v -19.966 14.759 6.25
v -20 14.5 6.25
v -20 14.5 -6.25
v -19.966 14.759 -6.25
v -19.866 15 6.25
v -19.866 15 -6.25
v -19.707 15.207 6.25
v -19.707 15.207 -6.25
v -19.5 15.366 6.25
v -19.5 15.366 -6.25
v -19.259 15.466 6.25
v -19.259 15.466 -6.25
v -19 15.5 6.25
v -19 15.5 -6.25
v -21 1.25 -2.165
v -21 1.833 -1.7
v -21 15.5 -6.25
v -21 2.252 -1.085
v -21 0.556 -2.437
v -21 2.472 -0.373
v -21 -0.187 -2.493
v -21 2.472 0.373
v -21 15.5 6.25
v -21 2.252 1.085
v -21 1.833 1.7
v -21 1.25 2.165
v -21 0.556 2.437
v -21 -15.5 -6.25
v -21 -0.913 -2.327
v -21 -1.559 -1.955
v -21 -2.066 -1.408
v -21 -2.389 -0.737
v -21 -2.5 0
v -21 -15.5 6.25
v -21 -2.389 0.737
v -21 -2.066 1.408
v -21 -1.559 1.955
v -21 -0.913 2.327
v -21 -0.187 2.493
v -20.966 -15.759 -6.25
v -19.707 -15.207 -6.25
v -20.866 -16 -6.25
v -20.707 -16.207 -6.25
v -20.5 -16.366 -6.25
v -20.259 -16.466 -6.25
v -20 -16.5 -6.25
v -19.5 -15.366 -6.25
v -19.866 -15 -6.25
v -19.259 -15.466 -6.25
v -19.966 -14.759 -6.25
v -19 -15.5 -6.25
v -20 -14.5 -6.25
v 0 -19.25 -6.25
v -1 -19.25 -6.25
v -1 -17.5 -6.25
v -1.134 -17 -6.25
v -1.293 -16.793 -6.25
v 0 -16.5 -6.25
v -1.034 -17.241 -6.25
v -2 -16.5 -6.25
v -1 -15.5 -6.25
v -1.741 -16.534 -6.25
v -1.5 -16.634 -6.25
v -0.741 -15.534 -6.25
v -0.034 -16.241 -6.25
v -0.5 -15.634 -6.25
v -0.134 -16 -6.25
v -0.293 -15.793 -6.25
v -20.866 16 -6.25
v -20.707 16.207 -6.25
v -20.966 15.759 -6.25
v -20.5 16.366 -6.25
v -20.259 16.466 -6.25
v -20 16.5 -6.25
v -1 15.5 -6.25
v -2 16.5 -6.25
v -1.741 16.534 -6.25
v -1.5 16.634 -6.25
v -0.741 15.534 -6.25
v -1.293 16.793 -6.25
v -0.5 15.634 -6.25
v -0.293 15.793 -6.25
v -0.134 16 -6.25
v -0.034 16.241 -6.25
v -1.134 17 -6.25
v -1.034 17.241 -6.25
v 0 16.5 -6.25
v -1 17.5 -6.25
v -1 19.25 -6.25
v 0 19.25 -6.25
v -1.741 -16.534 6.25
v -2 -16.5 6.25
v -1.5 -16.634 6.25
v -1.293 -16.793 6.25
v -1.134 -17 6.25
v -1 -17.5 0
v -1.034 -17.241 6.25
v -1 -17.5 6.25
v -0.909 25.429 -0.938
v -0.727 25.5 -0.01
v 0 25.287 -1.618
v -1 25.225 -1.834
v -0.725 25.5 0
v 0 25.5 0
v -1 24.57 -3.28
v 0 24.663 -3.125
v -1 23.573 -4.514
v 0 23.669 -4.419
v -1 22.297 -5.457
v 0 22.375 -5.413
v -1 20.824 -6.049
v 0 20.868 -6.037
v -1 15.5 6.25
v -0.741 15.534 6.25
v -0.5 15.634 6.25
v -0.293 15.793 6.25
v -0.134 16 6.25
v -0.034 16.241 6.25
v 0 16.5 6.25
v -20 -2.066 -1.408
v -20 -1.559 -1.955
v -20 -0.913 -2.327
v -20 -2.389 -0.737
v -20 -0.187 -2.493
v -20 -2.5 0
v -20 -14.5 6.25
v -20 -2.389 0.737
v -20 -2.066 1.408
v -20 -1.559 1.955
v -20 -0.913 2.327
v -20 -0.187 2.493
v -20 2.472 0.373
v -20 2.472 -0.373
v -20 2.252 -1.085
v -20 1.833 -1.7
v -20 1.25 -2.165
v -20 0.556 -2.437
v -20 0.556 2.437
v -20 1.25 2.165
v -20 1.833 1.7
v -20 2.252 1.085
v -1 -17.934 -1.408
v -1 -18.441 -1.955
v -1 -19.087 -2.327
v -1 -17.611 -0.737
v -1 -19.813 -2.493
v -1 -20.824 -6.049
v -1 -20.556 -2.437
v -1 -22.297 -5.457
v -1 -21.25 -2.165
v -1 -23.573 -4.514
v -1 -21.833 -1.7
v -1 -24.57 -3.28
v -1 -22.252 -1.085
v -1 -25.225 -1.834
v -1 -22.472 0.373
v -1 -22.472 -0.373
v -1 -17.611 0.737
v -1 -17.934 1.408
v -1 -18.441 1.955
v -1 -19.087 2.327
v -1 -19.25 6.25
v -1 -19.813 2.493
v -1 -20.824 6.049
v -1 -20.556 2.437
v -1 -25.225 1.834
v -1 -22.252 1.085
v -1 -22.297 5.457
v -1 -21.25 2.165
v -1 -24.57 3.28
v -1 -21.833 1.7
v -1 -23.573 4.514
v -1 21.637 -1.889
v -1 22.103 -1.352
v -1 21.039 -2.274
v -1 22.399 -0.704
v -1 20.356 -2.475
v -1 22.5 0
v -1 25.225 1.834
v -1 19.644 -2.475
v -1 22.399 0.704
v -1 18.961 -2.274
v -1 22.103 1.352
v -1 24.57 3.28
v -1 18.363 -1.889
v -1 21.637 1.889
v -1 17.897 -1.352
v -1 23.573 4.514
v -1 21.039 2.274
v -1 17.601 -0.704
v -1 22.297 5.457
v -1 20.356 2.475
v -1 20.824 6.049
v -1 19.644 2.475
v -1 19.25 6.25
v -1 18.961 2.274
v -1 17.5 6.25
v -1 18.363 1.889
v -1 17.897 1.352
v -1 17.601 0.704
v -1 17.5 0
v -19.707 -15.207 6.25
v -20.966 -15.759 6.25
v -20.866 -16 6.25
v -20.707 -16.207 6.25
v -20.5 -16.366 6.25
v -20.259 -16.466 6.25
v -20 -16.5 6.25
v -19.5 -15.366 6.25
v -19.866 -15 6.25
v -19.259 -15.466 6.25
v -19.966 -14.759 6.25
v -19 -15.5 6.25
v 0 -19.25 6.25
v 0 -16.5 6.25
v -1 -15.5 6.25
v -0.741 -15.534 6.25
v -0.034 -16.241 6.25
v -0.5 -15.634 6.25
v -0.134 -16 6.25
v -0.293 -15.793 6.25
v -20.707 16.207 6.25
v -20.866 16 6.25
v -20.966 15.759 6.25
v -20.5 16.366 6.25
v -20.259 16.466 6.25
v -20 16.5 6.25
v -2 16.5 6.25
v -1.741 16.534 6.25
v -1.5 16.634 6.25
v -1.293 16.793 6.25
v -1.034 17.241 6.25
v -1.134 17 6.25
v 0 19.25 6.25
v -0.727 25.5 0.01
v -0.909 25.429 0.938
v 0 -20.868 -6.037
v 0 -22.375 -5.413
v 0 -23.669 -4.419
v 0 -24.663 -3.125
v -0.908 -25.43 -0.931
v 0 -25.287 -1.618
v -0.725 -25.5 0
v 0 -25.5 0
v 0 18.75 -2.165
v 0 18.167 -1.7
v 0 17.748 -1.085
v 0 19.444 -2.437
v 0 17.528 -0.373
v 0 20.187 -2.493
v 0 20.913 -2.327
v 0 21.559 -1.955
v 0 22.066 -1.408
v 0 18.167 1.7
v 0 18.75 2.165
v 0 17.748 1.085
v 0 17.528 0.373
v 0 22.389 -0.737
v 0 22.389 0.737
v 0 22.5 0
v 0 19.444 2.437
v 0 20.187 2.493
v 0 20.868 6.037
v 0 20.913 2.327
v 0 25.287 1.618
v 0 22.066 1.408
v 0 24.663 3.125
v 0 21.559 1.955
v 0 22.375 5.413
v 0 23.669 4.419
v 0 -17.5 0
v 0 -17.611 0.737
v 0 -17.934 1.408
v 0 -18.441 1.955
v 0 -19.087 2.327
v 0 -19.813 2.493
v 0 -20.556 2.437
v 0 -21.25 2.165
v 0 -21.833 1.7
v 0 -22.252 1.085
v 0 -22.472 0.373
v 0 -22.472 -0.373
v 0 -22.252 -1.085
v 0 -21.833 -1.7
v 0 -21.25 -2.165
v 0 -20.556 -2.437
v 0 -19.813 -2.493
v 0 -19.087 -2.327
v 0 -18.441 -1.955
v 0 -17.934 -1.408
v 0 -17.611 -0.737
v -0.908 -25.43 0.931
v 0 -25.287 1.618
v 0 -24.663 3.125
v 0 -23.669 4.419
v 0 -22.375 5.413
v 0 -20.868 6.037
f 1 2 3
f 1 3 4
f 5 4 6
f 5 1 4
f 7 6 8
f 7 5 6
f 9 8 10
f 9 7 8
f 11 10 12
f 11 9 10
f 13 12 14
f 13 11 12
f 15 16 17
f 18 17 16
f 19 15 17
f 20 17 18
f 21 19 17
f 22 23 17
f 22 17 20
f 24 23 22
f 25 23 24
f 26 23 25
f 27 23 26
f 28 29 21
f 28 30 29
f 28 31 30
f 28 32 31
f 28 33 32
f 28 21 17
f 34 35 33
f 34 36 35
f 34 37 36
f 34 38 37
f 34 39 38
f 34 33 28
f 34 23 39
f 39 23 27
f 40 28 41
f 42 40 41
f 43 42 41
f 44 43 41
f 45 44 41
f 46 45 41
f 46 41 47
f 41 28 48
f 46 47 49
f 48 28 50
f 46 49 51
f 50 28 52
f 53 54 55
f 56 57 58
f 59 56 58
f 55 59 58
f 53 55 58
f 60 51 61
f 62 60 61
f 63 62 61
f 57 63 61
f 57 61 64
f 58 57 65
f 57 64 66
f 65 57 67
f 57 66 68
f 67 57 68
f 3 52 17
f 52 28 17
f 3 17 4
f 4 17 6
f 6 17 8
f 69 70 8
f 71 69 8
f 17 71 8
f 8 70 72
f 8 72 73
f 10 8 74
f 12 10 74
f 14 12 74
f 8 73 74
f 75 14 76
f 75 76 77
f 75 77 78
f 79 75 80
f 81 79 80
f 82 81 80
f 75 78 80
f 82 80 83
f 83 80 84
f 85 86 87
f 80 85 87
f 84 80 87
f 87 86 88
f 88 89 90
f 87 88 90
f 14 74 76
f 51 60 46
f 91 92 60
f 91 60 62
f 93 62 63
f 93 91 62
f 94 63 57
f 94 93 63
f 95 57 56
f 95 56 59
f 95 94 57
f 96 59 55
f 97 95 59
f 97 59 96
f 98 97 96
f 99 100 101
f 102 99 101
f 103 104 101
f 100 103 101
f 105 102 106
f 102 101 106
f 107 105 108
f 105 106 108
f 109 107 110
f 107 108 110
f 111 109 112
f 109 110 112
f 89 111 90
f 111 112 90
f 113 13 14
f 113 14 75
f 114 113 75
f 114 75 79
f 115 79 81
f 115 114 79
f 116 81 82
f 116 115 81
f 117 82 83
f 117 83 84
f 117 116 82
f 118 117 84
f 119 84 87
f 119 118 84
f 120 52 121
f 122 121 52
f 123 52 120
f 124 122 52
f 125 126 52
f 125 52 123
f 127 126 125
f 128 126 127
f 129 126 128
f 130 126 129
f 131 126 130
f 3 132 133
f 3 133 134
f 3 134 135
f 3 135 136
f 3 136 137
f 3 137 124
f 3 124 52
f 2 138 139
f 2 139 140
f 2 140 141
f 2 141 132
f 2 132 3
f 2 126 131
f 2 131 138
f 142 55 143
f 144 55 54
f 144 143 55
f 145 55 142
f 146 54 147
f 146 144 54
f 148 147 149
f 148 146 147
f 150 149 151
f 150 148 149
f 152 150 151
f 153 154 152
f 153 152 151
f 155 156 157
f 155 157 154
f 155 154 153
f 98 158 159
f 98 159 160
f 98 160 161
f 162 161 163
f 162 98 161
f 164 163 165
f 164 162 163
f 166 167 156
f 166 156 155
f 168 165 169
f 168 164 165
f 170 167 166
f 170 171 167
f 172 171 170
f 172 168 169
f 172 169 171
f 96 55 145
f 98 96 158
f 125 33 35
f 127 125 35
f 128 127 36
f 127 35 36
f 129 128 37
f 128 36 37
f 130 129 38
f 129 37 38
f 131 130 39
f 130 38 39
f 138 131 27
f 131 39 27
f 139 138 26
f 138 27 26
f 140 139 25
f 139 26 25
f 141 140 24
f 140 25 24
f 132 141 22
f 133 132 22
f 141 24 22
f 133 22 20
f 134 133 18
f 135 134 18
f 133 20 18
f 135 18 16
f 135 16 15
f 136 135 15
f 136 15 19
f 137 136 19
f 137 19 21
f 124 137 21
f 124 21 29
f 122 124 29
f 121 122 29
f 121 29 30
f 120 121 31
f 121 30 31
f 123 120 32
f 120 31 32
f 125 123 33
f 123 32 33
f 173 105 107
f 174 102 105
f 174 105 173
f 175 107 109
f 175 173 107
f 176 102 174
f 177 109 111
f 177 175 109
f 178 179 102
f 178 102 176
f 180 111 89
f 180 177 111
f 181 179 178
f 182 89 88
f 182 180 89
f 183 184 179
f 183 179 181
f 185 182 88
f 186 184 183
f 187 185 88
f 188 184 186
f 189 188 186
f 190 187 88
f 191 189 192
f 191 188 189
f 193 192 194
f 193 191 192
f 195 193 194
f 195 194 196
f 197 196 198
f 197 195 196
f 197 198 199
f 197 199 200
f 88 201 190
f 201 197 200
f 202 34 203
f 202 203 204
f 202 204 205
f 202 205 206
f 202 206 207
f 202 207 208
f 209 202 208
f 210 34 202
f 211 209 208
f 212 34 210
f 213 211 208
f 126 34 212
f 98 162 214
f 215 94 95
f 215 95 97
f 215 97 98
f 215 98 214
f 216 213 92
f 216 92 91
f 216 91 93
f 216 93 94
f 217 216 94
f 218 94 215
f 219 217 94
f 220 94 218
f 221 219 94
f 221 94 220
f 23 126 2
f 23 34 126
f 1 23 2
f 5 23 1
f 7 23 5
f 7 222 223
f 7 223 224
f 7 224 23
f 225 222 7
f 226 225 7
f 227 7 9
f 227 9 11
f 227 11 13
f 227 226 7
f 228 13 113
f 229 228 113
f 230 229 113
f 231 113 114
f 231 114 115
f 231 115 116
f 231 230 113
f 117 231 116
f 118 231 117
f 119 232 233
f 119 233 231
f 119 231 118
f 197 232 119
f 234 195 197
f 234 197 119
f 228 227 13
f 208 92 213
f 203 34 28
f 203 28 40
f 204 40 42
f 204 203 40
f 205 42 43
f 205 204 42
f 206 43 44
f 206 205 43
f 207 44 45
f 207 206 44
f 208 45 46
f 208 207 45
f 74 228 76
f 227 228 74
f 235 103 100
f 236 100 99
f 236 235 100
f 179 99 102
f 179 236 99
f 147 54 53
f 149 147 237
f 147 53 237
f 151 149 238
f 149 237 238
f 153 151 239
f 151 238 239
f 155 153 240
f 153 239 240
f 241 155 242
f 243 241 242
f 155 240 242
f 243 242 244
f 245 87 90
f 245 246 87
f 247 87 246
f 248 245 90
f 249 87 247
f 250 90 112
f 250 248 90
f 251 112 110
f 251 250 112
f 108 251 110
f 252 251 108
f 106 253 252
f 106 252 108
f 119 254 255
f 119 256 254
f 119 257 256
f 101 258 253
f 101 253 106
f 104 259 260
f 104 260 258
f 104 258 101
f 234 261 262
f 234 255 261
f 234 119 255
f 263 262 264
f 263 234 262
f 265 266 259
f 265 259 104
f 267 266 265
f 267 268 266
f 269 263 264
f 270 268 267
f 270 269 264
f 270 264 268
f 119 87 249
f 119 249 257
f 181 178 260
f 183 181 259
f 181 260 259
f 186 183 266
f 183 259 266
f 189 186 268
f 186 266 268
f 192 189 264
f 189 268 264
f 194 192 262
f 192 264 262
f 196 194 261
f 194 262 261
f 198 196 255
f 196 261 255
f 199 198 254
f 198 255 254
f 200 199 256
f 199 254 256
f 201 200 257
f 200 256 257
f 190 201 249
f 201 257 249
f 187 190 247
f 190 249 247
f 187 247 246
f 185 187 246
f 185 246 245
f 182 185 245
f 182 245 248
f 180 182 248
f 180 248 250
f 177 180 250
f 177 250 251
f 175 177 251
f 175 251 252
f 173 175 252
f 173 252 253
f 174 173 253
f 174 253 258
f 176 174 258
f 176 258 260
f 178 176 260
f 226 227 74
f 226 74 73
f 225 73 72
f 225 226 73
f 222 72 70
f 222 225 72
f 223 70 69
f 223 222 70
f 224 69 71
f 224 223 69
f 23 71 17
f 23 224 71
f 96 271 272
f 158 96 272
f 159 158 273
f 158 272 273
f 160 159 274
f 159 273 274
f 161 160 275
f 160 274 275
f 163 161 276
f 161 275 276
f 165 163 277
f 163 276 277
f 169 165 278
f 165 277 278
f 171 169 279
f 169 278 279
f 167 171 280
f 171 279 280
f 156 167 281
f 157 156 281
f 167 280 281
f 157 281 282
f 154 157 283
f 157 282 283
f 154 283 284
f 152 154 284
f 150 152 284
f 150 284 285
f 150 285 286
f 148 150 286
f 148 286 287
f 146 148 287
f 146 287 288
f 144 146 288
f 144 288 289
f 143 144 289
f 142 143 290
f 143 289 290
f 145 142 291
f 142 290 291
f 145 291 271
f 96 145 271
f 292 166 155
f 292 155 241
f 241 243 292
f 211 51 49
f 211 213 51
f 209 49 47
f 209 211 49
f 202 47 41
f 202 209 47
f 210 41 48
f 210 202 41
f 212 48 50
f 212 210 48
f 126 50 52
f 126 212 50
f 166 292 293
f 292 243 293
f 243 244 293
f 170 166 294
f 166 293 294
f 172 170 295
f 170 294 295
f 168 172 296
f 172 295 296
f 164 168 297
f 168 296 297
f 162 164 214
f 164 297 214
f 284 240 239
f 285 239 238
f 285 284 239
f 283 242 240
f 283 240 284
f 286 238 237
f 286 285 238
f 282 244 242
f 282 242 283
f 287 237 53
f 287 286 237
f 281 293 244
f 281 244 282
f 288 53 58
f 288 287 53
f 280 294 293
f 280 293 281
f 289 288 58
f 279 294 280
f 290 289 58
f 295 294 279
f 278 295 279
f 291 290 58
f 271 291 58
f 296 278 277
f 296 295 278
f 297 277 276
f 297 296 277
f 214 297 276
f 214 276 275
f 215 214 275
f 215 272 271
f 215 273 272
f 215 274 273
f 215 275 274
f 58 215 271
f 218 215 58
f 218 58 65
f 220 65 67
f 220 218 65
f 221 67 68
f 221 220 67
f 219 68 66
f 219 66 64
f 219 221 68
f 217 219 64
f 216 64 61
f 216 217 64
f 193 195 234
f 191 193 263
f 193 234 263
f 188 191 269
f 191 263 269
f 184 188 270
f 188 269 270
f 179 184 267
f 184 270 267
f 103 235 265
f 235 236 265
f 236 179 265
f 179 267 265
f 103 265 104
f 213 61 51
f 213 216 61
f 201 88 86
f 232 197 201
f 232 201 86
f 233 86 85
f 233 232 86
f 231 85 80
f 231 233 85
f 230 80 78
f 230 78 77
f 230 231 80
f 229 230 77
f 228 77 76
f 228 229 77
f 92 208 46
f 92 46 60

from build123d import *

# Parameters (mm, degrees)
F1_DEPTH = 6.25
F2_R     = 2.5
F3_DEPTH = 1
F4_R     = 2.5
F5_DEPTH = 1


with BuildPart() as f1:
    # F0 (on Top) → F1 (new body, symmetric)
    with BuildSketch(Plane.XY):
        with BuildLine():
            Line((-20, -14.5), (-20, 0))
            Line((-20, 0), (-21, 0))
            Line((-21, 0), (-21, -15.5))
            ThreePointArc((-21, -15.5), (-20.707107, -16.207107), (-20, -16.5))
            Line((-20, -16.5), (-2, -16.5))
            ThreePointArc((-2, -16.5), (-1.292893, -16.792893), (-1, -17.5))
            Line((-1, -17.5), (-1, -25.224715))
            ThreePointArc((-1, -25.224715), (-0.919371, -25.419371), (-0.724715, -25.5))
            Line((-0.724715, -25.5), (0, -25.5))
            Line((0, -25.5), (0, -16.5))
            ThreePointArc((0, -16.5), (-0.292893, -15.792893), (-1, -15.5))
            Line((-1, -15.5), (-19, -15.5))
            ThreePointArc((-19, -15.5), (-19.707107, -15.207107), (-20, -14.5))
        make_face()
        with BuildLine():
            Line((0, 16.5), (0, 25.5))
            Line((0, 25.5), (-0.724715, 25.5))
            ThreePointArc((-0.724715, 25.5), (-0.919371, 25.419371), (-1, 25.224715))
            Line((-1, 25.224715), (-1, 17.5))
            ThreePointArc((-1, 17.5), (-1.292893, 16.792893), (-2, 16.5))
            Line((-2, 16.5), (-20, 16.5))
            ThreePointArc((-20, 16.5), (-20.707107, 16.207107), (-21, 15.5))
            Line((-21, 15.5), (-21, 0))
            Line((-21, 0), (-20, 0))
            Line((-20, 0), (-20, 14.5))
            ThreePointArc((-20, 14.5), (-19.707107, 15.207107), (-19, 15.5))
            Line((-19, 15.5), (-1, 15.5))
            ThreePointArc((-1, 15.5), (-0.292893, 15.792893), (0, 16.5))
        make_face()
    extrude(amount=F1_DEPTH, both=True)

    # F2 (on face) → F3 (cut, through all)
    with BuildSketch(Plane.YZ):
        with BuildLine():
            Line((25.5, 6.25), (19.25, 6.25))
            ThreePointArc((19.25, 6.25), (23.669417, 4.419417), (25.5, 0))
            Line((25.5, 0), (25.5, 6.25))
        make_face()
        with Locations((20, 0)):
            Circle(F2_R)
        with BuildLine():
            Line((25.5, -6.25), (25.5, 0))
            ThreePointArc((25.5, 0), (23.669417, -4.419417), (19.25, -6.25))
            Line((19.25, -6.25), (25.5, -6.25))
        make_face()
        with Locations((-20, 0)):
            Circle(F2_R)
        with BuildLine():
            Line((-25.5, 6.25), (-25.5, 0))
            ThreePointArc((-25.5, 0), (-23.669417, 4.419417), (-19.25, 6.25))
            Line((-19.25, 6.25), (-25.5, 6.25))
        make_face()
        with BuildLine():
            Line((-25.5, -6.25), (-19.25, -6.25))
            ThreePointArc((-19.25, -6.25), (-23.669417, -4.419417), (-25.5, 0))
            Line((-25.5, 0), (-25.5, -6.25))
        make_face()
    extrude(amount=-F3_DEPTH, mode=Mode.SUBTRACT)

    # F4 (on face) → F5 (cut, through all)
    with BuildSketch(Plane(origin=(-21, 0, 0), x_dir=(0, -1, 0), z_dir=(-1, 0, 0))):
        Circle(F4_R)
    extrude(amount=-F5_DEPTH, mode=Mode.SUBTRACT)


solid = f1.part
